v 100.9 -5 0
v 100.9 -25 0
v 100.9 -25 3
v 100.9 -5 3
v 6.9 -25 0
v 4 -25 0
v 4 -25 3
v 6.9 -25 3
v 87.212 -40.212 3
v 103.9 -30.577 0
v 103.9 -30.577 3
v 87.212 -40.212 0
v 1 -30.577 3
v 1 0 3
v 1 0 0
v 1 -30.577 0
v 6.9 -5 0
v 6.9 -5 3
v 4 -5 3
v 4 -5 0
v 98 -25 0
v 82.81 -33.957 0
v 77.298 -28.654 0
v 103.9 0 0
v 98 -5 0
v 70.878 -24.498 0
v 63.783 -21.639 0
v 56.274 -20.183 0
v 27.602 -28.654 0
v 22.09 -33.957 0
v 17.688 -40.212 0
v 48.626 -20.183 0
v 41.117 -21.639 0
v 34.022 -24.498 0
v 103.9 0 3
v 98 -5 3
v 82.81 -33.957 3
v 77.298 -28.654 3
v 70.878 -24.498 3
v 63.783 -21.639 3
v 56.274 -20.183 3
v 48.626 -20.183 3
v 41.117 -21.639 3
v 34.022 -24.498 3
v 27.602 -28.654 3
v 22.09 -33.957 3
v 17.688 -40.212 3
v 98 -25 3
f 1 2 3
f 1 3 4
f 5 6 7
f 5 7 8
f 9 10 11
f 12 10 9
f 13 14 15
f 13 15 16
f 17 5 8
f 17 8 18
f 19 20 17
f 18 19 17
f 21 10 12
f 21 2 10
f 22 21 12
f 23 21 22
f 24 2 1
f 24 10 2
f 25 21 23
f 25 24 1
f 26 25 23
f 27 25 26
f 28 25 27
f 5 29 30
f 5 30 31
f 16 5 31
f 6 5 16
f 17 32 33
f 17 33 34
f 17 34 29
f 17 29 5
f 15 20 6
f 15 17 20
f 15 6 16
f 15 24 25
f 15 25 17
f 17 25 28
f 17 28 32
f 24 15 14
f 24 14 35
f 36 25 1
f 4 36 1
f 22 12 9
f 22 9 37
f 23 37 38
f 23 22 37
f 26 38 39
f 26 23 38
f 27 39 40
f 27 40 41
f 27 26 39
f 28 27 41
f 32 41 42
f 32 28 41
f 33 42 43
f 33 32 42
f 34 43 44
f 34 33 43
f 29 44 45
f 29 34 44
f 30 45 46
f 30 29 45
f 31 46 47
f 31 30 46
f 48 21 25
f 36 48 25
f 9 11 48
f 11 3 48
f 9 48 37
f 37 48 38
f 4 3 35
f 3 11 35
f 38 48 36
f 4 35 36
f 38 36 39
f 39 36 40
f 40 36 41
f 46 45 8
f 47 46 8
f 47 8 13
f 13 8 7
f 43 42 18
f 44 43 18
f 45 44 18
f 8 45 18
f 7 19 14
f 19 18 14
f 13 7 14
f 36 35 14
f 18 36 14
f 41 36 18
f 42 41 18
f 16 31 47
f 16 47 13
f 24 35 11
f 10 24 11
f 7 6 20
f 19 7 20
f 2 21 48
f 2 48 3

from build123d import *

# Parameters (mm, degrees)
SKETCH1_W           = 2.9
SKETCH1_H           = 20
BOSS_EXTRUDE1_DEPTH = 3
CUT_EXTRUDE1_DEPTH  = 4


with BuildPart() as part:
    # Sketch1 → Boss-Extrude1 (new body)
    with BuildSketch(Plane.XY):
        with BuildLine():
            Line((0, 0), (104.9, 0))
            Line((104.9, 0), (104.9, -30))
            Line((104.9, -30), (87.212489335, -40.211889044))
            ThreePointArc((87.212489335, -40.211889044), (52.45, -20), (17.687510665, -40.211889044))
            Line((17.687510665, -40.211889044), (0, -30))
            Line((0, -30), (0, 0))
        make_face()
        with Locations((99.45, -15)):
            Rectangle(SKETCH1_W, SKETCH1_H, mode=Mode.SUBTRACT)
        with Locations((5.45, -15)):
            Rectangle(SKETCH1_W, SKETCH1_H, mode=Mode.SUBTRACT)
    extrude(amount=BOSS_EXTRUDE1_DEPTH)

    # Sketch2 → Cut-Extrude1 (cut, through all)
    with BuildSketch(Plane.XY.offset(3)):
        Polygon((1, 0), (1, -30.577350269), (0, -30), (0, 0), align=None)
        Polygon((103.9, 0), (103.9, -30.577350269), (104.9, -30), (104.9, 0), align=None)
    extrude(amount=-CUT_EXTRUDE1_DEPTH, mode=Mode.SUBTRACT)


solid = part.part
